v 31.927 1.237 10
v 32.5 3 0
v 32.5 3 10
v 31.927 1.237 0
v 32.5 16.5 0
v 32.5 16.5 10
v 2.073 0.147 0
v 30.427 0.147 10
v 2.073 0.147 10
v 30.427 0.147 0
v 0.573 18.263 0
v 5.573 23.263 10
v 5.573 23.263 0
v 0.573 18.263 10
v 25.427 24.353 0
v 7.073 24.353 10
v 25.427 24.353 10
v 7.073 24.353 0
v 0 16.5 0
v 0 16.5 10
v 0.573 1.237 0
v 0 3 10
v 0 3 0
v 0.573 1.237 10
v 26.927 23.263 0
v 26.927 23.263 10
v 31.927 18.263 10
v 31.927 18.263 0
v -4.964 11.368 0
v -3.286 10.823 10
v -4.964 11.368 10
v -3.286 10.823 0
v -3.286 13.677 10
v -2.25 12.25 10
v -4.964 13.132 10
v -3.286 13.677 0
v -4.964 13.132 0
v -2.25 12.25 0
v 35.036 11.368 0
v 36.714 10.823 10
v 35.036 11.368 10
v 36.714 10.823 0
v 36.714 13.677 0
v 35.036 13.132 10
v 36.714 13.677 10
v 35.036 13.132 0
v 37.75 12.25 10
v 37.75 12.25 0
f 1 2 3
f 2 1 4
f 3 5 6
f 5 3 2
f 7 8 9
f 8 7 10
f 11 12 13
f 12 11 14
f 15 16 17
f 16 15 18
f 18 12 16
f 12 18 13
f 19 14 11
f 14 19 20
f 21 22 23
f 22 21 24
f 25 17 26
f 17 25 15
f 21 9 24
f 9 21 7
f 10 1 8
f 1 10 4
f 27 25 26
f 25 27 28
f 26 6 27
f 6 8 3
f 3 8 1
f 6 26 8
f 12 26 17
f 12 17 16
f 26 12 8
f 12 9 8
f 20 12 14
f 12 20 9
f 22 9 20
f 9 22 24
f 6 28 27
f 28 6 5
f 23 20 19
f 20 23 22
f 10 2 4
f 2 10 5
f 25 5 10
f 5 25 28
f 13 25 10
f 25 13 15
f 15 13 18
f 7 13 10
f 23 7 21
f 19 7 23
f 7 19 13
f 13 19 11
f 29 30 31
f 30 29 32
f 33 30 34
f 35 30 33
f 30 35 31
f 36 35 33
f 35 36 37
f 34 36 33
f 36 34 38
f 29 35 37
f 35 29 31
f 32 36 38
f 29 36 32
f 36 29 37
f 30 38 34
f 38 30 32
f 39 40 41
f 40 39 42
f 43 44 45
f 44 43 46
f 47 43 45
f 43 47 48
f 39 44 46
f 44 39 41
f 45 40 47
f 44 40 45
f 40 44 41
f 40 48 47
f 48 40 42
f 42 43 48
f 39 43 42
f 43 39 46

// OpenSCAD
/* 
Original http://www.thingiverse.com/thing:1680291
Customizable everything box (waterproof)
by mcseven
Licensed under the Creative Commons - Attribution - Share Alike license
*/

/* [Box Options] */
// Dimension: Box outer X-Size [mm]
box_Size_X          = 160;
// Dimension: Box outer Y-Size [mm]
box_Size_Y          = 110;
// Dimension: Box Inner height [mm]
box_Inner_Height    = 56;
// Box bottom/top thickness
box_BottomTop_Thickness =  1.5; // [0.6:0.2:3]
// Edge corner radius 
box_Screw_Corner_Radius   =  6; // [2:1:10]
// four outer screw hole diameters
box_Screw_Diameter     =  3.2; // [2:0.2:4]
// Box wall thickness
box_Wall_Thickness     =  3; // [0.4:0.2:3.2]
/* [Top Barrier Options] */
// Box barrier thickness
barrier_Thickness  =  1.2; // [0.4:0.2:3.2]
// Box barrier height
barrier_Height     =  2;   // [1.0:0.2:8]
// Additional width on the lid to correct for badly calibrated printers
barrier_Tolerance  =  0.2; // [0.0:0.1:1]
/* [Mouting Screw Nose Options] */
// Number of screw noses
screwnose_Number        = 4; // [0:No noses, 2: one top/one bottom, 4: two top/two bottom]
// Diameter of the noses' screw holes
screwnose_Diameter      = 4; // [2:0.2:8]
// Height of the noses
screwnose_Height        = 5; // [2:0.2:10]
// Wall thickness
screwnose_Wall_Thickness = 2.8; // [2:0.2:5]

euroOffset = 15;
euroHeight = 24.25;
euroWidth = 32;
euroRadius = 4;
euroStep = 34.5;

euroCorner = 6;

keystoneOffset = 20;
keystoneHeight = 12;

module connector_GSD4(depth) {
  conn_height = 24.5;
  conn_width = 32.5;
  conn_radius = 3;
  conn_corner = 5;

  hole_width = 40;
  hole_diameter = 3.0;

  conn_hole_distance = (hole_width-conn_width)/2;

  euro_connector(conn_height, conn_width, depth, conn_radius, conn_corner);
  translate([-conn_hole_distance, conn_height/2, 0])
    connector_hole(hole_diameter, depth);
  translate([conn_width+conn_hole_distance, conn_height/2, 0])
    connector_hole(hole_diameter, depth);

}

module connector_hole(diameter, depth) {
    cylinder(r=diameter/2, h=depth);
}


module euro_connector(height, width, depth, radius, corner) {
hull(){
translate([radius, radius, 0]) cylinder(r=radius, h=depth);
translate([width-radius, radius, 0]) cylinder(r=radius, h=depth);
translate([radius, height-radius-corner, 0]) cylinder(r=radius, h=depth);
translate([radius+corner, height-radius, 0]) cylinder(r=radius, h=depth);
translate([width-radius, height-radius-corner, 0]) cylinder(r=radius, h=depth);
translate([width-radius-corner, height-radius, 0]) cylinder(r=radius, h=depth);

}
}

// **************************
// ** Calculated globals
// **************************
boxHeight = box_Inner_Height+box_BottomTop_Thickness;

module box() {
	barrier_Thickness = box_Wall_Thickness-barrier_Thickness;
	difference() {
		union() {
			// solid round box, corners
			translate([box_Screw_Corner_Radius, box_Screw_Corner_Radius, 0]) cylinder(r=box_Screw_Corner_Radius, h=boxHeight, $fn=50); // bottom left
			translate([box_Size_X-box_Screw_Corner_Radius, box_Screw_Corner_Radius, 0]) cylinder(r=box_Screw_Corner_Radius, h=boxHeight, $fn=50); // bottom right
			translate([box_Screw_Corner_Radius, box_Size_Y-box_Screw_Corner_Radius, 0]) cylinder(r=box_Screw_Corner_Radius, h=boxHeight, $fn=50); // top left
			translate([box_Size_X-box_Screw_Corner_Radius, box_Size_Y-box_Screw_Corner_Radius, 0]) cylinder(r=box_Screw_Corner_Radius, h=boxHeight, $fn=50); // bottom right
			// solid round box, inner filling
			translate([0, box_Screw_Corner_Radius, 0]) cube([box_Size_X, box_Size_Y-2*box_Screw_Corner_Radius, boxHeight]);
			translate([box_Screw_Corner_Radius, 0, 0]) cube([box_Size_X-2*box_Screw_Corner_Radius, box_Size_Y, boxHeight]);
			// solid round box, top border
			translate([barrier_Thickness, box_Screw_Corner_Radius+barrier_Thickness, 0]) cube([box_Size_X-2*barrier_Thickness, box_Size_Y-2*box_Screw_Corner_Radius-2*barrier_Thickness, boxHeight+barrier_Height]);
			translate([box_Screw_Corner_Radius+barrier_Thickness, barrier_Thickness, 0]) cube([box_Size_X-2*box_Screw_Corner_Radius-2*barrier_Thickness, box_Size_Y-2*barrier_Thickness, boxHeight+barrier_Height]);

		}
		// inner cut-out
		translate([box_Wall_Thickness, box_Screw_Corner_Radius+box_Wall_Thickness, box_BottomTop_Thickness]) cube([box_Size_X-2*box_Wall_Thickness, box_Size_Y-2*box_Screw_Corner_Radius-2*box_Wall_Thickness, boxHeight+barrier_Height]);
		translate([box_Screw_Corner_Radius+box_Wall_Thickness, box_Wall_Thickness, box_BottomTop_Thickness]) cube([box_Size_X-2*box_Screw_Corner_Radius-2*box_Wall_Thickness, box_Size_Y-2*box_Wall_Thickness, boxHeight+barrier_Height]);
		// Screw holes
		translate([(box_Screw_Corner_Radius+box_Wall_Thickness)/2,(box_Screw_Corner_Radius+box_Wall_Thickness)/2,0]) cylinder(r=box_Screw_Diameter/2, h=boxHeight, $fn=20);
		translate([(box_Screw_Corner_Radius+box_Wall_Thickness)/2,box_Size_Y-(box_Screw_Corner_Radius+box_Wall_Thickness)/2,0]) cylinder(r=box_Screw_Diameter/2, h=boxHeight, $fn=20);
		translate([box_Size_X-(box_Screw_Corner_Radius+box_Wall_Thickness)/2,(box_Screw_Corner_Radius+box_Wall_Thickness)/2,0]) cylinder(r=box_Screw_Diameter/2, h=boxHeight, $fn=20);
		translate([box_Size_X-(box_Screw_Corner_Radius+box_Wall_Thickness)/2,box_Size_Y-(box_Screw_Corner_Radius+box_Wall_Thickness)/2,0]) cylinder(r=box_Screw_Diameter/2, h=boxHeight, $fn=20);
		// **************************
		// ** YOUR OWN CUTOUTS HERE!
		// **************************




	//	translate([box_Size_X-bncOffset,(box_Wall_Thickness+0.1), box_BottomTop_Thickness+20]) rotate([90,00,0]) cylinder(r=cRadius, h=box_Wall_Thickness+0.2,$fn=50);
	//	translate([box_Size_X-bncOffset-15.3,(box_Wall_Thickness+0.1), box_BottomTop_Thickness+20]) rotate([90,00,0]) cylinder(r=cRadius, h=box_Wall_Thickness+0.2,$fn=50);

        translate([euroOffset+0*euroStep,(box_Wall_Thickness+0.1), box_BottomTop_Thickness+15]) rotate([90,00,0]) cube([euroWidth, euroHeight, box_Wall_Thickness+1.2]);

        translate([euroOffset+1*euroStep,(box_Wall_Thickness+0.1), box_BottomTop_Thickness+15]) rotate([90,00,0]) cube([euroWidth, euroHeight, box_Wall_Thickness+1.2]);
        
        translate([euroOffset+2*euroStep,(box_Wall_Thickness+0.1), box_BottomTop_Thickness+15]) rotate([90,00,0]) cube([euroWidth, euroHeight, box_Wall_Thickness+1.2]);

        translate([euroOffset+3*euroStep,(box_Wall_Thickness+0.1), box_BottomTop_Thickness+15]) rotate([90,00,0]) cube([euroWidth, euroHeight, box_Wall_Thickness+1.2]);
  //      translate([dpsOffset+4*dpsStep,(box_Wall_Thickness+0.1), box_BottomTop_Thickness+dpsHeight]) rotate([90,00,0]) cube([6, 10.5, box_Wall_Thickness+1.2]);
    //    translate([dpsOffset+0*dpsStep,(box_Wall_Thickness+0.1), box_BottomTop_Thickness+dpsHeight]) rotate([90,00,0]) cube([6, 8, box_Wall_Thickness+1.2]);
        
        translate([keystoneOffset,(0.1+box_Size_Y), box_BottomTop_Thickness+keystoneHeight]) rotate([90,00,0]) cube([19.4, 15.95, box_Wall_Thickness+0.2]);

      translate([keystoneOffset,(0.1+box_Size_Y), box_BottomTop_Thickness+keystoneHeight]) rotate([90,00,0]) cube([19.4, 15.95, box_Wall_Thickness+0.2]);
//        translate([-0.1+box_Size_X-box_Wall_Thickness,(box_Size_Y-15), box_BottomTop_Thickness+keystoneHeight+2]) rotate([90,0,0]) cube([box_Wall_Thickness+0.2, 4*dpsStep+0.2, 2.9+0.2]);

//  translate([-0.1,35, box_BottomTop_Thickness+keystoneHeight+2]) rotate([90,0,0]) cube([box_Wall_Thickness+0.2, 4*dpsStep+0.2, 2.9+0.2]);

		// **************************
		// ** / CUTOUTS
		// **************************
	}
	// Lower nose(s)
	if (screwnose_Number==2) translate([box_Size_X/2, 0.001, 0]) mirror([0,1,0]) screwNose(screwnose_Diameter, screwnose_Height);
	if (screwnose_Number==4) {
		translate([box_Size_X*0.25, 0.001, 0]) mirror([0,1,0]) screwNose(screwnose_Diameter, screwnose_Height);
		translate([box_Size_X*0.75, 0.001, 0]) mirror([0,1,0]) screwNose(screwnose_Diameter, screwnose_Height);
	}
	// Upper nose(s)
	if (screwnose_Number==2) translate([box_Size_X/2, box_Size_Y-0.001, 0]) screwNose(screwnose_Diameter, screwnose_Height);
	if (screwnose_Number==4) {
		translate([box_Size_X*0.25, box_Size_Y-0.001, 0]) screwNose(screwnose_Diameter, screwnose_Height);
		translate([box_Size_X*0.75, box_Size_Y-0.001, 0]) screwNose(screwnose_Diameter, screwnose_Height);
	}
}

module lid() {
	boxHeight = box_BottomTop_Thickness+barrier_Height;
	difference() {
		union() {
			// solid round box, corners
			translate([box_Screw_Corner_Radius, box_Screw_Corner_Radius, 0]) cylinder(r=box_Screw_Corner_Radius, h=boxHeight, $fn=50); // bottom left
			translate([box_Size_X-box_Screw_Corner_Radius, box_Screw_Corner_Radius, 0]) cylinder(r=box_Screw_Corner_Radius, h=boxHeight, $fn=50); // bottom right
			translate([box_Screw_Corner_Radius, box_Size_Y-box_Screw_Corner_Radius, 0]) cylinder(r=box_Screw_Corner_Radius, h=boxHeight, $fn=50); // top left
			translate([box_Size_X-box_Screw_Corner_Radius, box_Size_Y-box_Screw_Corner_Radius, 0]) cylinder(r=box_Screw_Corner_Radius, h=boxHeight, $fn=50); // bottom right
			// solid round box, inner filling
			translate([0, box_Screw_Corner_Radius, 0]) cube([box_Size_X, box_Size_Y-2*box_Screw_Corner_Radius, boxHeight]);
			translate([box_Screw_Corner_Radius, 0, 0]) cube([box_Size_X-2*box_Screw_Corner_Radius, box_Size_Y, boxHeight]);
			// solid round box, top border
		}
		// inner cut-out X direction
		translate([
			box_Wall_Thickness-(barrier_Thickness+barrier_Tolerance),
			box_Screw_Corner_Radius+box_Wall_Thickness-(barrier_Thickness+barrier_Tolerance),
			box_BottomTop_Thickness
		]) cube([
			box_Size_X-2*(box_Wall_Thickness)+2*(barrier_Thickness+barrier_Tolerance),
			box_Size_Y-2*box_Screw_Corner_Radius-2*(box_Wall_Thickness)+2*(barrier_Thickness+barrier_Tolerance),
			box_BottomTop_Thickness+barrier_Height
		]);
		// inner cut-out Y direction
		translate([
			box_Screw_Corner_Radius+box_Wall_Thickness-(barrier_Thickness+barrier_Tolerance),
			box_Wall_Thickness-(barrier_Thickness+barrier_Tolerance),
			box_BottomTop_Thickness
		]) cube([
			box_Size_X-2*box_Screw_Corner_Radius-2*(box_Wall_Thickness)+2*(barrier_Thickness+barrier_Tolerance),
			box_Size_Y-2*(box_Wall_Thickness)+2*(barrier_Thickness+barrier_Tolerance),
			box_BottomTop_Thickness+barrier_Height
		]);
		
		// Screw holes
		translate([(box_Screw_Corner_Radius+box_Wall_Thickness)/2,(box_Screw_Corner_Radius+box_Wall_Thickness)/2,0]) cylinder(r=box_Screw_Diameter/2, h=boxHeight, $fn=20);
		translate([(box_Screw_Corner_Radius+box_Wall_Thickness)/2,box_Size_Y-(box_Screw_Corner_Radius+box_Wall_Thickness)/2,0]) cylinder(r=box_Screw_Diameter/2, h=boxHeight, $fn=20);
		translate([box_Size_X-(box_Screw_Corner_Radius+box_Wall_Thickness)/2,(box_Screw_Corner_Radius+box_Wall_Thickness)/2,0]) cylinder(r=box_Screw_Diameter/2, h=boxHeight, $fn=20);
		translate([box_Size_X-(box_Screw_Corner_Radius+box_Wall_Thickness)/2,box_Size_Y-(box_Screw_Corner_Radius+box_Wall_Thickness)/2,0]) cylinder(r=box_Screw_Diameter/2, h=boxHeight, $fn=20);
	}

	// inner add X direction
	translate([box_Wall_Thickness+barrier_Tolerance, box_Screw_Corner_Radius+box_Wall_Thickness+barrier_Tolerance, box_BottomTop_Thickness])
		cube([box_Size_X-2*(box_Wall_Thickness+barrier_Tolerance), box_Size_Y-2*(box_Screw_Corner_Radius+box_Wall_Thickness+barrier_Tolerance), barrier_Height]);
	// inner add Y direction
	translate([box_Screw_Corner_Radius+box_Wall_Thickness+barrier_Tolerance, box_Wall_Thickness+barrier_Tolerance, box_BottomTop_Thickness])
		cube([box_Size_X-2*(box_Screw_Corner_Radius+box_Wall_Thickness+barrier_Tolerance), box_Size_Y-2*(box_Wall_Thickness+barrier_Tolerance), barrier_Height]);
}

module screwNose(screwholeDiameter=4, noseHeight=5) {
	additionalDistanceFromWall = 1;
	translate([0,screwholeDiameter/2+screwnose_Wall_Thickness+additionalDistanceFromWall, 0]) difference() {
		union() {
			translate([-(screwholeDiameter/2+screwnose_Wall_Thickness), -(screwholeDiameter/2+screwnose_Wall_Thickness+additionalDistanceFromWall),0]) cube([(screwholeDiameter/2+screwnose_Wall_Thickness)*2, screwholeDiameter/2+screwnose_Wall_Thickness+additionalDistanceFromWall, noseHeight]);
			cylinder(r=(screwholeDiameter/2)+screwnose_Wall_Thickness, h=noseHeight, $fn=60);
		}
		cylinder(r=screwholeDiameter/2, h=noseHeight, $fn=60);
	}
}

//rotate([90,90,90])
connector_GSD4(10);

//box();
if (box_Size_X>box_Size_Y) {
	//translate([0, box_Size_Y+5+screwnose_Diameter+--screwnose_Wall_Thickness, 0]) lid();	
} else {
	//translate([box_Size_X+5, 0, 0]) lid();	
}
